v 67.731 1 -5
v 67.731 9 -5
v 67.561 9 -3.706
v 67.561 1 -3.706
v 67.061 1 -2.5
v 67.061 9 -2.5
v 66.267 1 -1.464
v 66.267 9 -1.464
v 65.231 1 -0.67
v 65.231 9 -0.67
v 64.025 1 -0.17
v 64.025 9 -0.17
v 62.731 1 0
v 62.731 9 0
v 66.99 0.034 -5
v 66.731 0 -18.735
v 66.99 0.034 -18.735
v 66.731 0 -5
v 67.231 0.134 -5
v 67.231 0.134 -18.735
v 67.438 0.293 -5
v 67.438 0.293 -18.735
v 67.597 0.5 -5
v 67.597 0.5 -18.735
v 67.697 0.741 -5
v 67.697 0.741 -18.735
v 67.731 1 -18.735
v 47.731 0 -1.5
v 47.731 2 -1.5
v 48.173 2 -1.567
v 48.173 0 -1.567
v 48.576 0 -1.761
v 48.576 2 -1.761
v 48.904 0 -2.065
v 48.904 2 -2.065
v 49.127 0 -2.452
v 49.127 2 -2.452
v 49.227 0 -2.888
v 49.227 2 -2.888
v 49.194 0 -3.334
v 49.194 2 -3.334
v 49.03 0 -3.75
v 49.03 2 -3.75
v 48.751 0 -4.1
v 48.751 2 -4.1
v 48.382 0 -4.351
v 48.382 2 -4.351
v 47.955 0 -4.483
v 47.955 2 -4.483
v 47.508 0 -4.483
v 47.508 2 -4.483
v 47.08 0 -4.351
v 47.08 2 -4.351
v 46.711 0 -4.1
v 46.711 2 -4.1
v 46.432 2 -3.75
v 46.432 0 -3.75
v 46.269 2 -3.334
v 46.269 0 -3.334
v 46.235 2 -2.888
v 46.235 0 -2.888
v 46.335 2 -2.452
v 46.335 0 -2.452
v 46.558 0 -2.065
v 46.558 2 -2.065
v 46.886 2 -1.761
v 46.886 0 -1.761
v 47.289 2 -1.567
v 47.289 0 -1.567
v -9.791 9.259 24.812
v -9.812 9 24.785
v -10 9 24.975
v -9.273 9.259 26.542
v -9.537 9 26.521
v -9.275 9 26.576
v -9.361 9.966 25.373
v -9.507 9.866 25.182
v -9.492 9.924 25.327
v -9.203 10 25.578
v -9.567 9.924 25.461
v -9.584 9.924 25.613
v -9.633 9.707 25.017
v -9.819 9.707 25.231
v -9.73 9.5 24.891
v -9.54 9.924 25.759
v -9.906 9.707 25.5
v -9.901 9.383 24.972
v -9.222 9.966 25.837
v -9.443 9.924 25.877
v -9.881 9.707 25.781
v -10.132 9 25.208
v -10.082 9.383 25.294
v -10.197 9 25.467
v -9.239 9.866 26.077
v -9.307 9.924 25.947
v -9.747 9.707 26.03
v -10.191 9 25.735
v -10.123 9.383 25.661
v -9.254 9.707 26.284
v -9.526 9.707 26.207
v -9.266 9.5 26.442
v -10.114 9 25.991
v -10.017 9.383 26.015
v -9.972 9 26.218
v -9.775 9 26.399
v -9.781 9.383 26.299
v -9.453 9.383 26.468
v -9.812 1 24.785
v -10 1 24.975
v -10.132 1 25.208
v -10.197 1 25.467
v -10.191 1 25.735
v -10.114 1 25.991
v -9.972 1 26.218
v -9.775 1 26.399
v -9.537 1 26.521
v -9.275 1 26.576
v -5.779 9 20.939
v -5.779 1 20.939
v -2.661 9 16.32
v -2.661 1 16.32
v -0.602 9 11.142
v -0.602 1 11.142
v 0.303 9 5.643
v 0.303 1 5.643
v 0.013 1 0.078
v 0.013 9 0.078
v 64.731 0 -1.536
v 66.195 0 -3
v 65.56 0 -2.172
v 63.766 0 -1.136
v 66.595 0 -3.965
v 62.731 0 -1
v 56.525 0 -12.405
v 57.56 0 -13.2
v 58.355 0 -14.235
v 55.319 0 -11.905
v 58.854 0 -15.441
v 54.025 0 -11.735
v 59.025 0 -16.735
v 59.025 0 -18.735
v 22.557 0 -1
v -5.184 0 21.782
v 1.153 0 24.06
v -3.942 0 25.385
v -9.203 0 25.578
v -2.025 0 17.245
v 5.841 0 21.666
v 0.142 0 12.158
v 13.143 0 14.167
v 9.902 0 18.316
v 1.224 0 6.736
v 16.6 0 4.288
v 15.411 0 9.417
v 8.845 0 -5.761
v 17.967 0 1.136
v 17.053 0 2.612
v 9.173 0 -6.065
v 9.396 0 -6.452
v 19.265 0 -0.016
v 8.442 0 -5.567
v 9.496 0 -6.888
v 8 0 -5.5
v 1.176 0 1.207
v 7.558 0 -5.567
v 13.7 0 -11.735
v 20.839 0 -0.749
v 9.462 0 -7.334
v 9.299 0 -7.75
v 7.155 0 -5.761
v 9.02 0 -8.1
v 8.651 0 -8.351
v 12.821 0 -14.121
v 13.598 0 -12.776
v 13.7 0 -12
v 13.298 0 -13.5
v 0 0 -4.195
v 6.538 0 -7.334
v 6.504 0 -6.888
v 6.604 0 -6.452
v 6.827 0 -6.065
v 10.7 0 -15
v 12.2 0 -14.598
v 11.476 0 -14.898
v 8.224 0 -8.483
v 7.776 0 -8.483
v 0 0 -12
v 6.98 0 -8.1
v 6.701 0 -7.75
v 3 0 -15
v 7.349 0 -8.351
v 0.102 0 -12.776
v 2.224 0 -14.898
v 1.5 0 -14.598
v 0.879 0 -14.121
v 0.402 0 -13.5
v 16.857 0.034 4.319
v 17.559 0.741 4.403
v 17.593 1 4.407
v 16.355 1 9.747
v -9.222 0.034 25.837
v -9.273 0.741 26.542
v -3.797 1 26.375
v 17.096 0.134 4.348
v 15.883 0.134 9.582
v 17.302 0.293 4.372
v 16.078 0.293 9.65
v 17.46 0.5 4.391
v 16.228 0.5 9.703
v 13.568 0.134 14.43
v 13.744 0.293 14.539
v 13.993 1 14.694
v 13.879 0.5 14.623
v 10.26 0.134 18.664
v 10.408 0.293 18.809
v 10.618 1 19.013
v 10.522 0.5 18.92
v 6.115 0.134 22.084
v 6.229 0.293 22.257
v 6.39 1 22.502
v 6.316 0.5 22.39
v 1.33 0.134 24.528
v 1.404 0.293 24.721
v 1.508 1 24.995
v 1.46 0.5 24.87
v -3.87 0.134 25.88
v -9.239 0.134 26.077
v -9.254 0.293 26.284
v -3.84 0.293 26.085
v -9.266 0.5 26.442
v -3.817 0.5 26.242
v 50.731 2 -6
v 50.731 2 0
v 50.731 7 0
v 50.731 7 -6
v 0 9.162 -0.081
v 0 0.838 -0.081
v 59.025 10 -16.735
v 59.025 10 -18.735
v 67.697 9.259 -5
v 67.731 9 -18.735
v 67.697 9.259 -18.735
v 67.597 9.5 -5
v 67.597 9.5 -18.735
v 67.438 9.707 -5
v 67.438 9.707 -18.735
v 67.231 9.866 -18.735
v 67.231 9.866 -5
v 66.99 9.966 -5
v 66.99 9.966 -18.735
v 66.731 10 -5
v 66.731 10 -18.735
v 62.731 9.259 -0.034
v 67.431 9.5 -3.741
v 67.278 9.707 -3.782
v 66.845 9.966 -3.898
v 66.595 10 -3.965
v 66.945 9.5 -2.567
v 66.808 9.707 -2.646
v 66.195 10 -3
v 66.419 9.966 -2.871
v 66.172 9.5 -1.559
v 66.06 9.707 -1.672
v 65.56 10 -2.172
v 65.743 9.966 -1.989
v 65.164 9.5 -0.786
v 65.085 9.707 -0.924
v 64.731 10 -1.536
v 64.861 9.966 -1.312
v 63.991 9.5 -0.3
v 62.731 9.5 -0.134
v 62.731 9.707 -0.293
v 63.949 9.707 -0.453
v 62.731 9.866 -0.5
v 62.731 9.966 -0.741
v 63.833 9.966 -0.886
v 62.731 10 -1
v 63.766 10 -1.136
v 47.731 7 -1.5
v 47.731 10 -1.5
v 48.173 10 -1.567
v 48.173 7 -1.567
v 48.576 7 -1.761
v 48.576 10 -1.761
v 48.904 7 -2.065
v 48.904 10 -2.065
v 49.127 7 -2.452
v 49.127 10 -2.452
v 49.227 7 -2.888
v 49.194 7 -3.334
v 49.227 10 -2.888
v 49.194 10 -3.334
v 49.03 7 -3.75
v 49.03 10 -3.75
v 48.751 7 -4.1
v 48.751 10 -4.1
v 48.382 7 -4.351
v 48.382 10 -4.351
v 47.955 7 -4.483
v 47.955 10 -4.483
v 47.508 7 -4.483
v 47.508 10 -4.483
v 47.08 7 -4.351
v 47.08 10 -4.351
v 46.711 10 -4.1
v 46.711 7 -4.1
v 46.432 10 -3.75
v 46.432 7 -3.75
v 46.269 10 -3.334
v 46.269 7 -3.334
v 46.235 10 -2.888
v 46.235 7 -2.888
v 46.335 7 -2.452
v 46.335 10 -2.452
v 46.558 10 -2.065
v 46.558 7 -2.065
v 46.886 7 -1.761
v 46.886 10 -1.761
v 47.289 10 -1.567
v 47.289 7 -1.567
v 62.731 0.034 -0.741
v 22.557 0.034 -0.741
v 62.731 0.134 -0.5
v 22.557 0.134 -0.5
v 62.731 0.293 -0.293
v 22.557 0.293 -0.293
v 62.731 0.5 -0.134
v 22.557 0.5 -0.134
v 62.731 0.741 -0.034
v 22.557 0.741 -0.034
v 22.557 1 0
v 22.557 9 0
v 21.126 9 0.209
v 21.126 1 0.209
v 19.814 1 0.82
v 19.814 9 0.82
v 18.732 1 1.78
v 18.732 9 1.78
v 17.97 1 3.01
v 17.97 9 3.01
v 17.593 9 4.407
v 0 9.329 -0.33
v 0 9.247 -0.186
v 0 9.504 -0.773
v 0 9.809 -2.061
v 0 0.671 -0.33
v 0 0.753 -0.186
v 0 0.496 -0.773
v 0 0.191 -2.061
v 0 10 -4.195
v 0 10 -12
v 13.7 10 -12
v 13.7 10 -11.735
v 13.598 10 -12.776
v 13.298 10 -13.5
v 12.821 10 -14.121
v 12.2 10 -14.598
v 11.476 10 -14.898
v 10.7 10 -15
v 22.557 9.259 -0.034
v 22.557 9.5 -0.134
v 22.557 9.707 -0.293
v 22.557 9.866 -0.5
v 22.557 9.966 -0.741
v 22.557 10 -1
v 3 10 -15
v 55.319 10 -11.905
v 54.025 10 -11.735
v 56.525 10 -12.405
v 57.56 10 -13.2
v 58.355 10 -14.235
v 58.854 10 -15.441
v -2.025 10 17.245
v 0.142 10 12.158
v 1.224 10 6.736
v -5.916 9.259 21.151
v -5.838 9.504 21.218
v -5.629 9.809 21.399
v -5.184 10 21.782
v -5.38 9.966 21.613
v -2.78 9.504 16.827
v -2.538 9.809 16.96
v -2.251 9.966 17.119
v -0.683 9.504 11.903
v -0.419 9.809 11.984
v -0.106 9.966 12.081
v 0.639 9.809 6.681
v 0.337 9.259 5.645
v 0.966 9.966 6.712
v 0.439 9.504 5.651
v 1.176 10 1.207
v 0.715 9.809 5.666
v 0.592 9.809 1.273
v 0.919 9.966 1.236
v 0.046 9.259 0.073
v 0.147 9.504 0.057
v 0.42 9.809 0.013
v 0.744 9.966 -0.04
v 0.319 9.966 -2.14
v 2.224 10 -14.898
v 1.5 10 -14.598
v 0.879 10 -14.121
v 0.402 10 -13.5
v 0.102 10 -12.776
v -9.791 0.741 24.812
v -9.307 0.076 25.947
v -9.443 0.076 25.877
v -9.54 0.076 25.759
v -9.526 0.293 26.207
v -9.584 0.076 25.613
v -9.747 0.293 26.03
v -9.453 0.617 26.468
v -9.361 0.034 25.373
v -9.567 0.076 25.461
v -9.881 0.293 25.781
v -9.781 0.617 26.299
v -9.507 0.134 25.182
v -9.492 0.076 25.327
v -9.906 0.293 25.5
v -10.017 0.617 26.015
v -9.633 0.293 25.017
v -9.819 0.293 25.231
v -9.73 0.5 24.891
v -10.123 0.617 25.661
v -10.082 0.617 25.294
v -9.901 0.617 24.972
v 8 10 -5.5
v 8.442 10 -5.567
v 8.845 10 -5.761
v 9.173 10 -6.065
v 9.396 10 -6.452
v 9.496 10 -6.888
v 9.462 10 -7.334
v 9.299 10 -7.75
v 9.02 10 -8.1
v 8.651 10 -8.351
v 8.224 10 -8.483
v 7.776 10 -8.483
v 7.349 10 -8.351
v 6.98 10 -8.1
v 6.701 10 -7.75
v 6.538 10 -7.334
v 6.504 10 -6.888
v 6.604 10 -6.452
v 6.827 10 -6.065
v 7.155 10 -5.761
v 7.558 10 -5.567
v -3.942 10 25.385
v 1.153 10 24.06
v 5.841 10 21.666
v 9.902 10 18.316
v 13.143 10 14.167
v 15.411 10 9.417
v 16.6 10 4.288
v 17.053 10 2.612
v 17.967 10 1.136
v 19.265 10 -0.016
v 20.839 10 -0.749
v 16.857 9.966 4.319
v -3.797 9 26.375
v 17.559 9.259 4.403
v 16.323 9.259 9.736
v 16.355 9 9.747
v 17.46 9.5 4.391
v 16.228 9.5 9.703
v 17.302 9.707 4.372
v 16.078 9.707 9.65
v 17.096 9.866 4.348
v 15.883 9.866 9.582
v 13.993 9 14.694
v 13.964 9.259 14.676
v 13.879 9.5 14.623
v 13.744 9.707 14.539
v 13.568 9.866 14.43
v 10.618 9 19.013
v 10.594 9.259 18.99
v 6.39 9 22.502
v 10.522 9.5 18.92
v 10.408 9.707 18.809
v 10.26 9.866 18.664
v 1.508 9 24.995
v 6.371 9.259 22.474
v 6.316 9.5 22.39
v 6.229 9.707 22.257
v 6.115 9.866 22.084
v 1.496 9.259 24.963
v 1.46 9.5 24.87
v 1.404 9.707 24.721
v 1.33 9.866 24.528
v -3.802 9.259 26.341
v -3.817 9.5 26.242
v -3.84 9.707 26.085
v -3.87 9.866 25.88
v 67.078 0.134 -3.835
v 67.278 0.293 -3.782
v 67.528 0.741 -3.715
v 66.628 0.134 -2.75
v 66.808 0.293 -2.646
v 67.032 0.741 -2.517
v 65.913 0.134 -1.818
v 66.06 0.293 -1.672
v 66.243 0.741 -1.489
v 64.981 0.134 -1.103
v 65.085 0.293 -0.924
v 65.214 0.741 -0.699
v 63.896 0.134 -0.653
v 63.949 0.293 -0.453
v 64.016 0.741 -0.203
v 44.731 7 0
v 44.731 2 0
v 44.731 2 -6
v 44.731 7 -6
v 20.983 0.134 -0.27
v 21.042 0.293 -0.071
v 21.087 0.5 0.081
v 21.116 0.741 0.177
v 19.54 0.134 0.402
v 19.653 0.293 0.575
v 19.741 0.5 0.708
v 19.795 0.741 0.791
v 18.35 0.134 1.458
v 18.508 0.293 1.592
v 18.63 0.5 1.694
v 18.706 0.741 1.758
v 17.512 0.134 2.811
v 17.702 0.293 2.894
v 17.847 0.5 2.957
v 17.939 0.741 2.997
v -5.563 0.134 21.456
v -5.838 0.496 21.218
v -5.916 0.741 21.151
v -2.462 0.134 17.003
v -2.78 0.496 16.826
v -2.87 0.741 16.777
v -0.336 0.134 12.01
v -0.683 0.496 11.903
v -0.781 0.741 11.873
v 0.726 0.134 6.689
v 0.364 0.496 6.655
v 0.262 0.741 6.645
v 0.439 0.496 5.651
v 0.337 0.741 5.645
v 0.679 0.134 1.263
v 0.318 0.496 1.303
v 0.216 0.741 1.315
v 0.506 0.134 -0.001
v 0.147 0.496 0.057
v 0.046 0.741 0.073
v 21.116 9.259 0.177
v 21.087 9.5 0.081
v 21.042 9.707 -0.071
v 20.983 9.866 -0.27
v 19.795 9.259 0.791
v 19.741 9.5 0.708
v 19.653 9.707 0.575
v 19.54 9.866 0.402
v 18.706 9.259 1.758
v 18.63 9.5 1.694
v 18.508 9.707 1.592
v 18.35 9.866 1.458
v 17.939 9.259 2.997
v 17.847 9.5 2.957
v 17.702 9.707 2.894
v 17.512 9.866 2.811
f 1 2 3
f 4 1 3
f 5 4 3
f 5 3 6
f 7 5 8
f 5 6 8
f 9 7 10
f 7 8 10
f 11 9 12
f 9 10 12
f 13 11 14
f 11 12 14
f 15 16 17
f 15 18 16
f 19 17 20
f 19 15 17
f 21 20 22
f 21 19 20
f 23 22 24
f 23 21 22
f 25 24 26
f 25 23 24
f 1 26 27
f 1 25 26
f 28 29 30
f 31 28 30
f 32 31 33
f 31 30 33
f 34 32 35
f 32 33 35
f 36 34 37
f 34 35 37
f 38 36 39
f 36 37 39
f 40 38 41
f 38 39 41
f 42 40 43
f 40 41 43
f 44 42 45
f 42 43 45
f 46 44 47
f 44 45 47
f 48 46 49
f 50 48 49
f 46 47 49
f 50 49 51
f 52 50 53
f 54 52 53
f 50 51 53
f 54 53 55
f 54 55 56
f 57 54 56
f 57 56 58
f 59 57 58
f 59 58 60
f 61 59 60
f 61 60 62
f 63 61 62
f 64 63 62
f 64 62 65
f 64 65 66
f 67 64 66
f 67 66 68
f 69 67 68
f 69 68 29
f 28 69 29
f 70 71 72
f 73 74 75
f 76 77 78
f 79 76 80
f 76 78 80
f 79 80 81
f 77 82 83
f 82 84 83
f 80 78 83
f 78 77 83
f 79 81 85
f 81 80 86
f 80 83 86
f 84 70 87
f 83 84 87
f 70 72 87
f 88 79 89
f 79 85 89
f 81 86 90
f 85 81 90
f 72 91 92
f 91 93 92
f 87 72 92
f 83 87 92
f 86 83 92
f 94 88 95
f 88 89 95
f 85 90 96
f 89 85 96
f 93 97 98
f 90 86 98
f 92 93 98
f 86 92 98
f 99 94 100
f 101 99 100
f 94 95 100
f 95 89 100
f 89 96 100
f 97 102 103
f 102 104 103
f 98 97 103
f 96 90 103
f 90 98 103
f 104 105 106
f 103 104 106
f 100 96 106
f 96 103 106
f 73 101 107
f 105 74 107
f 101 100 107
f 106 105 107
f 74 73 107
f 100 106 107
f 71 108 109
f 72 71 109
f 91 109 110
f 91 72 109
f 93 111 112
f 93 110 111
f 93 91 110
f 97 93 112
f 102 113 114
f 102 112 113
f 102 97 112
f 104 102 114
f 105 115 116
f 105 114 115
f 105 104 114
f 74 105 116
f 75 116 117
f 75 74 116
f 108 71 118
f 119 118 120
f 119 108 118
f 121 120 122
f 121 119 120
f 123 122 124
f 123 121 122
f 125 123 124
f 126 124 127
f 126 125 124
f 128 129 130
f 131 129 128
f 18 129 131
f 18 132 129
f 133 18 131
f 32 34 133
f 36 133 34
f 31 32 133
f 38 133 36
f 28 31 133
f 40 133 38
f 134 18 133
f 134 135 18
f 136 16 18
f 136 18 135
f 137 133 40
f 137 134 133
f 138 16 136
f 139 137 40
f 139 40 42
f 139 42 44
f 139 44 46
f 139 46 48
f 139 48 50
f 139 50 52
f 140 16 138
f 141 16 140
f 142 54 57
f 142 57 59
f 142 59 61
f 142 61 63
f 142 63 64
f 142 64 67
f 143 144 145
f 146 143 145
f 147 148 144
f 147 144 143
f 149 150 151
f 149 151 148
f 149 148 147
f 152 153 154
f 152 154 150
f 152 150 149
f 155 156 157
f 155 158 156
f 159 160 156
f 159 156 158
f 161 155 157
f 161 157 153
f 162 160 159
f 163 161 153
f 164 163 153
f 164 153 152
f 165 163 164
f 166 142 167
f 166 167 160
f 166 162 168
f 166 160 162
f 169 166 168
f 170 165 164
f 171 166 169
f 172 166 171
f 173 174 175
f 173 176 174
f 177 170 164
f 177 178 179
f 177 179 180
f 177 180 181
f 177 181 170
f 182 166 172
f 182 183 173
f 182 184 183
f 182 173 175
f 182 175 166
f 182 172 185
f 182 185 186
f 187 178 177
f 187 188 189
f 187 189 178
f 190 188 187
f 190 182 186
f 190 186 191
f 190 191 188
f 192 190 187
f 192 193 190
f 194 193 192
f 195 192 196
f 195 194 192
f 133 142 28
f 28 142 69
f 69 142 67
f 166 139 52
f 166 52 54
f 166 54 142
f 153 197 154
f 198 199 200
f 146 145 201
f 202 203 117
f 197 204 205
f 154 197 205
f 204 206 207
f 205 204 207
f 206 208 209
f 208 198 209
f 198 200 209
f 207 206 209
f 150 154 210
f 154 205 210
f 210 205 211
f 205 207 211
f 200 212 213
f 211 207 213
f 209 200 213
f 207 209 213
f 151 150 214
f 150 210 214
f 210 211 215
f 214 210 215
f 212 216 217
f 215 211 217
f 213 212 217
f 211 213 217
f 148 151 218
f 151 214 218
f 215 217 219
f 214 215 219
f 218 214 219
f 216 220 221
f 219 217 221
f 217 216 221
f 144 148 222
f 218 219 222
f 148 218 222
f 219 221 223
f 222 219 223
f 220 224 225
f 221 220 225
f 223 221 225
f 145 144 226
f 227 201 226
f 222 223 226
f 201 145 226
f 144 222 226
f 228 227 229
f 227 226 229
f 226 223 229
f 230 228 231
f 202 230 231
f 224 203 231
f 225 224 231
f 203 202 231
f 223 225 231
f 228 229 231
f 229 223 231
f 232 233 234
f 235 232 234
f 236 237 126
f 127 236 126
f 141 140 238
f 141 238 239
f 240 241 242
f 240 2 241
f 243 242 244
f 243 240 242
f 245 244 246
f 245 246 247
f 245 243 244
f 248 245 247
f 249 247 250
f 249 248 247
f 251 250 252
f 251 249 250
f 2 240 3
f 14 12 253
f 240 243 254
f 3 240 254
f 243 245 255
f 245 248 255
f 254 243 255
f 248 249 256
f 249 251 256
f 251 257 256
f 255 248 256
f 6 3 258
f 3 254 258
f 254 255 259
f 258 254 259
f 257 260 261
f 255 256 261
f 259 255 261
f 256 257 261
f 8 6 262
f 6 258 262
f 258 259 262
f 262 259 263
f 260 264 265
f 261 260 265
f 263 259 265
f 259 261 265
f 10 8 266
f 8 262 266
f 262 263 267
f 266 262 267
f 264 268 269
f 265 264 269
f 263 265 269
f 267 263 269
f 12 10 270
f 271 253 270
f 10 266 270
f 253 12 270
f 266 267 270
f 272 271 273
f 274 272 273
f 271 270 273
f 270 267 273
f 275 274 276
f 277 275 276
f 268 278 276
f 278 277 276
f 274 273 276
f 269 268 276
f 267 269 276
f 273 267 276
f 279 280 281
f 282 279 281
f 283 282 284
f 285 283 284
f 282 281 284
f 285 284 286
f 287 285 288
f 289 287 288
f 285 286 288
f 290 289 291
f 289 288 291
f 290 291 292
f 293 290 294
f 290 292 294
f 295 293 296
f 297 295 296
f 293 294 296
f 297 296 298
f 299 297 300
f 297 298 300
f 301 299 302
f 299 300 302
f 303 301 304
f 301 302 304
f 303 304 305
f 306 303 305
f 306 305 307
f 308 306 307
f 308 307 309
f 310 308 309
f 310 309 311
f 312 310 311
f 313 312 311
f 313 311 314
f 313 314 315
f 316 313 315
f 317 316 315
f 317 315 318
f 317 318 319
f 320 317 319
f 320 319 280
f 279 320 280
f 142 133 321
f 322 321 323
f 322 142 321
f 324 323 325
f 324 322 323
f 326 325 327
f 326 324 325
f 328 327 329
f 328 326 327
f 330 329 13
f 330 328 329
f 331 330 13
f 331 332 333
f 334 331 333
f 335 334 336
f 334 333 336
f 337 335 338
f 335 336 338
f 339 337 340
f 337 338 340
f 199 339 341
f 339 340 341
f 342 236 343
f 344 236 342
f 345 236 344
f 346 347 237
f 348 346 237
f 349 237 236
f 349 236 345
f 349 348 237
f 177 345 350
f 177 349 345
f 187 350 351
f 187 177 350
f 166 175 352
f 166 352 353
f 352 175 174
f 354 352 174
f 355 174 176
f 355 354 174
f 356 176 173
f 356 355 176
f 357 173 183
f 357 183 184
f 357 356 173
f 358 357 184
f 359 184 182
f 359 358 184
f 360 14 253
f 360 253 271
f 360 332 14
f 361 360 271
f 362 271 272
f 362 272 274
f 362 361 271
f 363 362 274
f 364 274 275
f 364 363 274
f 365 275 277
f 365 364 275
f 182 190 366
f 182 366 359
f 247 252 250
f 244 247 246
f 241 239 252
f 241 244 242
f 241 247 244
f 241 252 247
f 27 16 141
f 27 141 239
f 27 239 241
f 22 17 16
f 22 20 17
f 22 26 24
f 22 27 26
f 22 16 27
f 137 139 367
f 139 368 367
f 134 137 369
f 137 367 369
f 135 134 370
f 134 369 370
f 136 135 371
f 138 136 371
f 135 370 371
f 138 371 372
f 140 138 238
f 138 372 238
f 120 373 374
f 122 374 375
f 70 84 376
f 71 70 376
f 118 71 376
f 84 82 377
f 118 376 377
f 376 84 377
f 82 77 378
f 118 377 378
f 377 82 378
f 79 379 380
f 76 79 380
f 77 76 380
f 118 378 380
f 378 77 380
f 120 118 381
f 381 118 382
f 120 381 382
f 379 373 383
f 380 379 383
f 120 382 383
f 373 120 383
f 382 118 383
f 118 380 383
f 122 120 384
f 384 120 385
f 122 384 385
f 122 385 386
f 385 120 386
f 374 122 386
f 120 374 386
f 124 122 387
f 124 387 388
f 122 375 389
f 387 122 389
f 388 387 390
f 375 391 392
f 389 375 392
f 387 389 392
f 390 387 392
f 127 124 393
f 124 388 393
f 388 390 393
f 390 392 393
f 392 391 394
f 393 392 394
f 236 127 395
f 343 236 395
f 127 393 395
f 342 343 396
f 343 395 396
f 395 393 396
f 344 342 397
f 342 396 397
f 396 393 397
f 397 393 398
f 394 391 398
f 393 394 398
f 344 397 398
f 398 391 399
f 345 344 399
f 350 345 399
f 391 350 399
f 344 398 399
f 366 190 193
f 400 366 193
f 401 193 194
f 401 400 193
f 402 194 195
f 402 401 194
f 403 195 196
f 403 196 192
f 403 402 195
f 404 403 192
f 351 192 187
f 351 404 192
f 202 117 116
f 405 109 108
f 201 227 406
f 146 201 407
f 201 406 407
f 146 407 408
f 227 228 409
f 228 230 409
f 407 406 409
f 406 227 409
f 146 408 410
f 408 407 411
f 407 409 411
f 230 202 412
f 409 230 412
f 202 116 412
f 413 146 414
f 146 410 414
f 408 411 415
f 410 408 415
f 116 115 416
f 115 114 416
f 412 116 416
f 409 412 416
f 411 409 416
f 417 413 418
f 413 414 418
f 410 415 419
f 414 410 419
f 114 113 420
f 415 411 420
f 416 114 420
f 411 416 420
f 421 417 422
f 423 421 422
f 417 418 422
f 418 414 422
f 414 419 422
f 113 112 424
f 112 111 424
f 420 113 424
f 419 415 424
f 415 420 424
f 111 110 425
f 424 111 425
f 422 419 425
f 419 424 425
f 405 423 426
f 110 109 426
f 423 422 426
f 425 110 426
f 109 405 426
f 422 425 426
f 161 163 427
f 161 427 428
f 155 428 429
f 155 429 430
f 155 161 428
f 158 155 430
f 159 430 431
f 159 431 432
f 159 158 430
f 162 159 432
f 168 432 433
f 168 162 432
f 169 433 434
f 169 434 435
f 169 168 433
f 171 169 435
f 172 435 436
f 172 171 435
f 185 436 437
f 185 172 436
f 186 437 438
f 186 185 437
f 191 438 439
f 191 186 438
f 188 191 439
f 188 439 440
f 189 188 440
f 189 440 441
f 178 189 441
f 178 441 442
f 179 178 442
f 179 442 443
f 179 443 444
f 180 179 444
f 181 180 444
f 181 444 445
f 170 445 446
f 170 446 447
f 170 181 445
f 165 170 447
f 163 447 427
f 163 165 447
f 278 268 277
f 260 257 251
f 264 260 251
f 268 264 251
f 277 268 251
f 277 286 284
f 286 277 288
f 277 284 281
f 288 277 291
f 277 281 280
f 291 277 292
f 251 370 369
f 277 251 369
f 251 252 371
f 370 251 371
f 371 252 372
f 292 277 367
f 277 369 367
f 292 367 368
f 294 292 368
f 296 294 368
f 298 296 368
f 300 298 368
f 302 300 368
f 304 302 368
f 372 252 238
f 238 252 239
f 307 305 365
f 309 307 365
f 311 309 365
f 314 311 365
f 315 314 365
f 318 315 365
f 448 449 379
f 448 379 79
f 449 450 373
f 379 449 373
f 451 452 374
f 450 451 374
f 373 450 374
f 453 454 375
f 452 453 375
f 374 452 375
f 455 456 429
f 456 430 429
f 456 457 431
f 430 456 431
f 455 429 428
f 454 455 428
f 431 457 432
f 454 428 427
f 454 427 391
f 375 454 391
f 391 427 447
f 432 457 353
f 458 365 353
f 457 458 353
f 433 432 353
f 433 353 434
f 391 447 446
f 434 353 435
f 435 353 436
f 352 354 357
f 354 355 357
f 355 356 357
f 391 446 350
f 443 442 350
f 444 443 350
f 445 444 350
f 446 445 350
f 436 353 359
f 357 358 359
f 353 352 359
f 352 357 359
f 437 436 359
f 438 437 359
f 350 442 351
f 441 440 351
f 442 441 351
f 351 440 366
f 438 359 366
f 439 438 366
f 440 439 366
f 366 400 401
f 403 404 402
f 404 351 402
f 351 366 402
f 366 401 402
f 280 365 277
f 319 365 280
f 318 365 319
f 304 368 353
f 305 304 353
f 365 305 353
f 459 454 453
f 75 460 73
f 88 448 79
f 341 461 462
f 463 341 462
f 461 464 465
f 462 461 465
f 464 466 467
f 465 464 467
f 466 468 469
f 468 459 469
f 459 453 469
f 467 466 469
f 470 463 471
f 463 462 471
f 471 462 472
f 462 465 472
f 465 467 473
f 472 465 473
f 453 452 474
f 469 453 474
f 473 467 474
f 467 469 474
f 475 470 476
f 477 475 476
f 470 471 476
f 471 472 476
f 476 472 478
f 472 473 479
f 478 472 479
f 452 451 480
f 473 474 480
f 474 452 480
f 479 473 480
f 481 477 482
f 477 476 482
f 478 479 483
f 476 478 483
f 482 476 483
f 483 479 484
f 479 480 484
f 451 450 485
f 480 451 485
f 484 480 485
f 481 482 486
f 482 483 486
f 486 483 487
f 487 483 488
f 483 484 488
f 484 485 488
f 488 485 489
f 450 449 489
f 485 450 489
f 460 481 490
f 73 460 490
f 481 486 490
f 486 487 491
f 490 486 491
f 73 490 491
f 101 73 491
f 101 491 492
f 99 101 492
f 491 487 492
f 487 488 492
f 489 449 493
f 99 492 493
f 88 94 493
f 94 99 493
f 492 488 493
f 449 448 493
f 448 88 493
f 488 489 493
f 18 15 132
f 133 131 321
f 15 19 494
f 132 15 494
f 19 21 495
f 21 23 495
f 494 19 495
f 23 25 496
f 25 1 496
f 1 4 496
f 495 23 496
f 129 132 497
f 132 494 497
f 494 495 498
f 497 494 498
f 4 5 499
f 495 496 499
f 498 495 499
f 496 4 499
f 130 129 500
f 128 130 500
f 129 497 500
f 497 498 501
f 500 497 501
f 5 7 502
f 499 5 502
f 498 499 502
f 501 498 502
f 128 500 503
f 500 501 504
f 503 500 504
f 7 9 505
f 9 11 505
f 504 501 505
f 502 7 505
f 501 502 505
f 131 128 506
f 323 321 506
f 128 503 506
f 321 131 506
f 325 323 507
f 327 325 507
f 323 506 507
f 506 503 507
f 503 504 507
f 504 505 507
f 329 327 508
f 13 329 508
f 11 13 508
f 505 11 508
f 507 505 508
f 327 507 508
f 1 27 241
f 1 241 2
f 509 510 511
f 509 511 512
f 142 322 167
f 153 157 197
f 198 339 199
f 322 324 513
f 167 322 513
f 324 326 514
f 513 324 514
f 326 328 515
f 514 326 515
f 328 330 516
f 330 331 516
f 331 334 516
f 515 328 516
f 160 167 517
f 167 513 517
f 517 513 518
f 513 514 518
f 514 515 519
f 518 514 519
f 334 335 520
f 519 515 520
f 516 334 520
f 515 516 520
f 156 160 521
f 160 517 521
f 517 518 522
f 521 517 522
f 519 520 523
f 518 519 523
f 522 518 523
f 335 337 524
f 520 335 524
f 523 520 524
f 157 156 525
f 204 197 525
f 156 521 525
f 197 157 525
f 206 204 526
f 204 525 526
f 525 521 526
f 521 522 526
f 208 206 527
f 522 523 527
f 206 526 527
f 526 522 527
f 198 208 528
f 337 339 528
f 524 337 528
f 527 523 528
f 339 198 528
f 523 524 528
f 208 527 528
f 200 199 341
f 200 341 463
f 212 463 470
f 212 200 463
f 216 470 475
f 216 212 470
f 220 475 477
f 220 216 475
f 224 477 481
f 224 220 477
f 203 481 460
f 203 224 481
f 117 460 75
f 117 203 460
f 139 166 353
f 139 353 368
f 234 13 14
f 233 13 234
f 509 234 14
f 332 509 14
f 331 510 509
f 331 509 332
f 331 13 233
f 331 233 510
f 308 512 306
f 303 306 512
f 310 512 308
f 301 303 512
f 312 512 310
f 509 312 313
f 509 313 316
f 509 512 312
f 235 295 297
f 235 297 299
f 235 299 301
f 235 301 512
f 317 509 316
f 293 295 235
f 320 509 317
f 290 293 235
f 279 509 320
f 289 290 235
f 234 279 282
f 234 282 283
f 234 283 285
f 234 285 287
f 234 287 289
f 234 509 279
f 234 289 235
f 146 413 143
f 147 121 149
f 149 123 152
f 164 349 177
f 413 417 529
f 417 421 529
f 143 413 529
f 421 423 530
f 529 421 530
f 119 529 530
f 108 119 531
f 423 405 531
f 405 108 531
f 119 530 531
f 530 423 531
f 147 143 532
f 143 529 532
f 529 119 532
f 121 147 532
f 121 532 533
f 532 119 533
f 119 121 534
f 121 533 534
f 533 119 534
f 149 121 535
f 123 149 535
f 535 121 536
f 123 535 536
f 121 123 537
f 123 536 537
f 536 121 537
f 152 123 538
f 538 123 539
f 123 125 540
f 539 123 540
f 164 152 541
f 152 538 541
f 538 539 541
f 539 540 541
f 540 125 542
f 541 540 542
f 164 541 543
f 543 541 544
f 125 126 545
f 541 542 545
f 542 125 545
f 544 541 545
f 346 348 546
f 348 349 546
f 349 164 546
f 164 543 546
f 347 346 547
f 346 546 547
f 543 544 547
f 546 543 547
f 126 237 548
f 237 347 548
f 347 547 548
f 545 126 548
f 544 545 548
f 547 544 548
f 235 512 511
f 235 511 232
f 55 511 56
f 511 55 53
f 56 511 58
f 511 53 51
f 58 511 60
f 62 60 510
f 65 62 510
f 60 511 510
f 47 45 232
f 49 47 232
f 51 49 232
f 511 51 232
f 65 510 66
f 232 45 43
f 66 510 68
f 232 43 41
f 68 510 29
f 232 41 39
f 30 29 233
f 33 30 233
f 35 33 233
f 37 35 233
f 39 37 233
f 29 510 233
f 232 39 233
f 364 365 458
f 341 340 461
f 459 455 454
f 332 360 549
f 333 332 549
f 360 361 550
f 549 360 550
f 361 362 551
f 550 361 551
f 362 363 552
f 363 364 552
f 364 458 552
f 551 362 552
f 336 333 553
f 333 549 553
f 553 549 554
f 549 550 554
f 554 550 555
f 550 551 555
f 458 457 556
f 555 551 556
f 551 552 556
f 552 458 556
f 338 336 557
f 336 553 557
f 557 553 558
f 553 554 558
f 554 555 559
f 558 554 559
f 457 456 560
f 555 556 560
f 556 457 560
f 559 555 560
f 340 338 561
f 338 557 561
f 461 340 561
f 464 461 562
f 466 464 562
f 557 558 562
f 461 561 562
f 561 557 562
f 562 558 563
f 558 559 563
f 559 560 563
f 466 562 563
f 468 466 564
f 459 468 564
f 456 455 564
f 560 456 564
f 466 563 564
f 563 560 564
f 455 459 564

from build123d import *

# Parameters (mm, degrees)
CROQUIS1_R              = 1.5
SALIENTE_EXTRUIR1_DEPTH = 10
REDONDEO1_R             = 3
CROQUIS3_R              = 1.5
CORTAR_EXTRUIR2_DEPTH   = 11
REDONDEO2_R             = 5
CROQUIS4_W              = 6
CROQUIS4_H              = 5
CORTAR_EXTRUIR3_DEPTH   = 6
REDONDEO3_R             = 1


with BuildPart() as part:
    # Croquis1 → Saliente-Extruir1 (new body)
    with BuildSketch(Plane(origin=(0, 0, 0), x_dir=(1, 0, 0), z_dir=(0, 1, 0))):
        with BuildLine():
            Line((13.699946153, 11.735059562), (59.024625957, 11.735059562))
            Line((59.024625957, 11.735059562), (59.024625957, 18.735059562))
            Line((59.024625957, 18.735059562), (67.731133792, 18.735059562))
            Line((67.731133792, 18.735059562), (67.731133792, 0))
            Line((67.731133792, 0), (17.731133792, 0))
            ThreePointArc((17.731133792, 0), (9.262538254, -20.305782945), (-11.922145642, -26.243046592))
            ThreePointArc((-11.922145642, -26.243046592), (-1.979394551, -14.930389049), (0, 0))
            Line((0, 0), (0, 15))
            Line((0, 15), (13.699946153, 15))
            Line((13.699946153, 15), (13.699946153, 11.735059562))
        make_face()
        with Locations(Location((8, 7, 0), (0, 0, 270))):
            Circle(CROQUIS1_R, mode=Mode.SUBTRACT)
    extrude(amount=SALIENTE_EXTRUIR1_DEPTH)

    # Redondeo1
    redondeo1_edges = [part.edges().sort_by_distance(p)[0] for p in [
        (0, 5, -15),
        (13.699946153, 5, -15),
    ]]
    fillet(redondeo1_edges, radius=REDONDEO1_R)

    # Croquis3 → Cortar-Extruir2 (cut)
    with BuildSketch(Plane(origin=(0, 10, 0), x_dir=(1, 0, 0), z_dir=(0, 1, 0))):
        with Locations(Location((47.731133792, 3, 0), (0, 0, 270))):
            Circle(CROQUIS3_R)
    extrude(amount=-CORTAR_EXTRUIR2_DEPTH, mode=Mode.SUBTRACT)

    # Redondeo2
    redondeo2_edges = [part.edges().sort_by_distance(p)[0] for p in [
        (67.731133792, 5, 0),
        (17.731133792, 5, 0),
        (59.024625957, 5, -11.735059562),
    ]]
    fillet(redondeo2_edges, radius=REDONDEO2_R)

    # Croquis4 → Cortar-Extruir3 (cut)
    with BuildSketch(Plane.XY):
        with Locations((47.731133792, 4.5)):
            Rectangle(CROQUIS4_W, CROQUIS4_H)
    extrude(amount=-CORTAR_EXTRUIR3_DEPTH, mode=Mode.SUBTRACT)

    # Redondeo3
    redondeo3_edges = [part.edges().sort_by_distance(p)[0] for p in [
        (7.547710992, 0, 21.694525169),
        (-1.979394551, 0, 14.930389049),
        (-11.922145642, 5, 26.243046592),
        (0, 5, 0),
        (-1.979394551, 10, 14.930389049),
        (7.547710992, 10, 21.694525169),
        (67.731133792, 0, -11.867529781),
        (67.731133792, 10, -11.867529781),
        (42.644255321, 0, 0),
        (66.266667698, 0, -1.464466094),
        (42.644255321, 10, 0),
        (66.266667698, 10, -1.464466094),
        (19.238162868, 0, 1.260639287),
        (19.238162868, 10, 1.260639287),
    ]]
    fillet(redondeo3_edges, radius=REDONDEO3_R)


solid = part.part
